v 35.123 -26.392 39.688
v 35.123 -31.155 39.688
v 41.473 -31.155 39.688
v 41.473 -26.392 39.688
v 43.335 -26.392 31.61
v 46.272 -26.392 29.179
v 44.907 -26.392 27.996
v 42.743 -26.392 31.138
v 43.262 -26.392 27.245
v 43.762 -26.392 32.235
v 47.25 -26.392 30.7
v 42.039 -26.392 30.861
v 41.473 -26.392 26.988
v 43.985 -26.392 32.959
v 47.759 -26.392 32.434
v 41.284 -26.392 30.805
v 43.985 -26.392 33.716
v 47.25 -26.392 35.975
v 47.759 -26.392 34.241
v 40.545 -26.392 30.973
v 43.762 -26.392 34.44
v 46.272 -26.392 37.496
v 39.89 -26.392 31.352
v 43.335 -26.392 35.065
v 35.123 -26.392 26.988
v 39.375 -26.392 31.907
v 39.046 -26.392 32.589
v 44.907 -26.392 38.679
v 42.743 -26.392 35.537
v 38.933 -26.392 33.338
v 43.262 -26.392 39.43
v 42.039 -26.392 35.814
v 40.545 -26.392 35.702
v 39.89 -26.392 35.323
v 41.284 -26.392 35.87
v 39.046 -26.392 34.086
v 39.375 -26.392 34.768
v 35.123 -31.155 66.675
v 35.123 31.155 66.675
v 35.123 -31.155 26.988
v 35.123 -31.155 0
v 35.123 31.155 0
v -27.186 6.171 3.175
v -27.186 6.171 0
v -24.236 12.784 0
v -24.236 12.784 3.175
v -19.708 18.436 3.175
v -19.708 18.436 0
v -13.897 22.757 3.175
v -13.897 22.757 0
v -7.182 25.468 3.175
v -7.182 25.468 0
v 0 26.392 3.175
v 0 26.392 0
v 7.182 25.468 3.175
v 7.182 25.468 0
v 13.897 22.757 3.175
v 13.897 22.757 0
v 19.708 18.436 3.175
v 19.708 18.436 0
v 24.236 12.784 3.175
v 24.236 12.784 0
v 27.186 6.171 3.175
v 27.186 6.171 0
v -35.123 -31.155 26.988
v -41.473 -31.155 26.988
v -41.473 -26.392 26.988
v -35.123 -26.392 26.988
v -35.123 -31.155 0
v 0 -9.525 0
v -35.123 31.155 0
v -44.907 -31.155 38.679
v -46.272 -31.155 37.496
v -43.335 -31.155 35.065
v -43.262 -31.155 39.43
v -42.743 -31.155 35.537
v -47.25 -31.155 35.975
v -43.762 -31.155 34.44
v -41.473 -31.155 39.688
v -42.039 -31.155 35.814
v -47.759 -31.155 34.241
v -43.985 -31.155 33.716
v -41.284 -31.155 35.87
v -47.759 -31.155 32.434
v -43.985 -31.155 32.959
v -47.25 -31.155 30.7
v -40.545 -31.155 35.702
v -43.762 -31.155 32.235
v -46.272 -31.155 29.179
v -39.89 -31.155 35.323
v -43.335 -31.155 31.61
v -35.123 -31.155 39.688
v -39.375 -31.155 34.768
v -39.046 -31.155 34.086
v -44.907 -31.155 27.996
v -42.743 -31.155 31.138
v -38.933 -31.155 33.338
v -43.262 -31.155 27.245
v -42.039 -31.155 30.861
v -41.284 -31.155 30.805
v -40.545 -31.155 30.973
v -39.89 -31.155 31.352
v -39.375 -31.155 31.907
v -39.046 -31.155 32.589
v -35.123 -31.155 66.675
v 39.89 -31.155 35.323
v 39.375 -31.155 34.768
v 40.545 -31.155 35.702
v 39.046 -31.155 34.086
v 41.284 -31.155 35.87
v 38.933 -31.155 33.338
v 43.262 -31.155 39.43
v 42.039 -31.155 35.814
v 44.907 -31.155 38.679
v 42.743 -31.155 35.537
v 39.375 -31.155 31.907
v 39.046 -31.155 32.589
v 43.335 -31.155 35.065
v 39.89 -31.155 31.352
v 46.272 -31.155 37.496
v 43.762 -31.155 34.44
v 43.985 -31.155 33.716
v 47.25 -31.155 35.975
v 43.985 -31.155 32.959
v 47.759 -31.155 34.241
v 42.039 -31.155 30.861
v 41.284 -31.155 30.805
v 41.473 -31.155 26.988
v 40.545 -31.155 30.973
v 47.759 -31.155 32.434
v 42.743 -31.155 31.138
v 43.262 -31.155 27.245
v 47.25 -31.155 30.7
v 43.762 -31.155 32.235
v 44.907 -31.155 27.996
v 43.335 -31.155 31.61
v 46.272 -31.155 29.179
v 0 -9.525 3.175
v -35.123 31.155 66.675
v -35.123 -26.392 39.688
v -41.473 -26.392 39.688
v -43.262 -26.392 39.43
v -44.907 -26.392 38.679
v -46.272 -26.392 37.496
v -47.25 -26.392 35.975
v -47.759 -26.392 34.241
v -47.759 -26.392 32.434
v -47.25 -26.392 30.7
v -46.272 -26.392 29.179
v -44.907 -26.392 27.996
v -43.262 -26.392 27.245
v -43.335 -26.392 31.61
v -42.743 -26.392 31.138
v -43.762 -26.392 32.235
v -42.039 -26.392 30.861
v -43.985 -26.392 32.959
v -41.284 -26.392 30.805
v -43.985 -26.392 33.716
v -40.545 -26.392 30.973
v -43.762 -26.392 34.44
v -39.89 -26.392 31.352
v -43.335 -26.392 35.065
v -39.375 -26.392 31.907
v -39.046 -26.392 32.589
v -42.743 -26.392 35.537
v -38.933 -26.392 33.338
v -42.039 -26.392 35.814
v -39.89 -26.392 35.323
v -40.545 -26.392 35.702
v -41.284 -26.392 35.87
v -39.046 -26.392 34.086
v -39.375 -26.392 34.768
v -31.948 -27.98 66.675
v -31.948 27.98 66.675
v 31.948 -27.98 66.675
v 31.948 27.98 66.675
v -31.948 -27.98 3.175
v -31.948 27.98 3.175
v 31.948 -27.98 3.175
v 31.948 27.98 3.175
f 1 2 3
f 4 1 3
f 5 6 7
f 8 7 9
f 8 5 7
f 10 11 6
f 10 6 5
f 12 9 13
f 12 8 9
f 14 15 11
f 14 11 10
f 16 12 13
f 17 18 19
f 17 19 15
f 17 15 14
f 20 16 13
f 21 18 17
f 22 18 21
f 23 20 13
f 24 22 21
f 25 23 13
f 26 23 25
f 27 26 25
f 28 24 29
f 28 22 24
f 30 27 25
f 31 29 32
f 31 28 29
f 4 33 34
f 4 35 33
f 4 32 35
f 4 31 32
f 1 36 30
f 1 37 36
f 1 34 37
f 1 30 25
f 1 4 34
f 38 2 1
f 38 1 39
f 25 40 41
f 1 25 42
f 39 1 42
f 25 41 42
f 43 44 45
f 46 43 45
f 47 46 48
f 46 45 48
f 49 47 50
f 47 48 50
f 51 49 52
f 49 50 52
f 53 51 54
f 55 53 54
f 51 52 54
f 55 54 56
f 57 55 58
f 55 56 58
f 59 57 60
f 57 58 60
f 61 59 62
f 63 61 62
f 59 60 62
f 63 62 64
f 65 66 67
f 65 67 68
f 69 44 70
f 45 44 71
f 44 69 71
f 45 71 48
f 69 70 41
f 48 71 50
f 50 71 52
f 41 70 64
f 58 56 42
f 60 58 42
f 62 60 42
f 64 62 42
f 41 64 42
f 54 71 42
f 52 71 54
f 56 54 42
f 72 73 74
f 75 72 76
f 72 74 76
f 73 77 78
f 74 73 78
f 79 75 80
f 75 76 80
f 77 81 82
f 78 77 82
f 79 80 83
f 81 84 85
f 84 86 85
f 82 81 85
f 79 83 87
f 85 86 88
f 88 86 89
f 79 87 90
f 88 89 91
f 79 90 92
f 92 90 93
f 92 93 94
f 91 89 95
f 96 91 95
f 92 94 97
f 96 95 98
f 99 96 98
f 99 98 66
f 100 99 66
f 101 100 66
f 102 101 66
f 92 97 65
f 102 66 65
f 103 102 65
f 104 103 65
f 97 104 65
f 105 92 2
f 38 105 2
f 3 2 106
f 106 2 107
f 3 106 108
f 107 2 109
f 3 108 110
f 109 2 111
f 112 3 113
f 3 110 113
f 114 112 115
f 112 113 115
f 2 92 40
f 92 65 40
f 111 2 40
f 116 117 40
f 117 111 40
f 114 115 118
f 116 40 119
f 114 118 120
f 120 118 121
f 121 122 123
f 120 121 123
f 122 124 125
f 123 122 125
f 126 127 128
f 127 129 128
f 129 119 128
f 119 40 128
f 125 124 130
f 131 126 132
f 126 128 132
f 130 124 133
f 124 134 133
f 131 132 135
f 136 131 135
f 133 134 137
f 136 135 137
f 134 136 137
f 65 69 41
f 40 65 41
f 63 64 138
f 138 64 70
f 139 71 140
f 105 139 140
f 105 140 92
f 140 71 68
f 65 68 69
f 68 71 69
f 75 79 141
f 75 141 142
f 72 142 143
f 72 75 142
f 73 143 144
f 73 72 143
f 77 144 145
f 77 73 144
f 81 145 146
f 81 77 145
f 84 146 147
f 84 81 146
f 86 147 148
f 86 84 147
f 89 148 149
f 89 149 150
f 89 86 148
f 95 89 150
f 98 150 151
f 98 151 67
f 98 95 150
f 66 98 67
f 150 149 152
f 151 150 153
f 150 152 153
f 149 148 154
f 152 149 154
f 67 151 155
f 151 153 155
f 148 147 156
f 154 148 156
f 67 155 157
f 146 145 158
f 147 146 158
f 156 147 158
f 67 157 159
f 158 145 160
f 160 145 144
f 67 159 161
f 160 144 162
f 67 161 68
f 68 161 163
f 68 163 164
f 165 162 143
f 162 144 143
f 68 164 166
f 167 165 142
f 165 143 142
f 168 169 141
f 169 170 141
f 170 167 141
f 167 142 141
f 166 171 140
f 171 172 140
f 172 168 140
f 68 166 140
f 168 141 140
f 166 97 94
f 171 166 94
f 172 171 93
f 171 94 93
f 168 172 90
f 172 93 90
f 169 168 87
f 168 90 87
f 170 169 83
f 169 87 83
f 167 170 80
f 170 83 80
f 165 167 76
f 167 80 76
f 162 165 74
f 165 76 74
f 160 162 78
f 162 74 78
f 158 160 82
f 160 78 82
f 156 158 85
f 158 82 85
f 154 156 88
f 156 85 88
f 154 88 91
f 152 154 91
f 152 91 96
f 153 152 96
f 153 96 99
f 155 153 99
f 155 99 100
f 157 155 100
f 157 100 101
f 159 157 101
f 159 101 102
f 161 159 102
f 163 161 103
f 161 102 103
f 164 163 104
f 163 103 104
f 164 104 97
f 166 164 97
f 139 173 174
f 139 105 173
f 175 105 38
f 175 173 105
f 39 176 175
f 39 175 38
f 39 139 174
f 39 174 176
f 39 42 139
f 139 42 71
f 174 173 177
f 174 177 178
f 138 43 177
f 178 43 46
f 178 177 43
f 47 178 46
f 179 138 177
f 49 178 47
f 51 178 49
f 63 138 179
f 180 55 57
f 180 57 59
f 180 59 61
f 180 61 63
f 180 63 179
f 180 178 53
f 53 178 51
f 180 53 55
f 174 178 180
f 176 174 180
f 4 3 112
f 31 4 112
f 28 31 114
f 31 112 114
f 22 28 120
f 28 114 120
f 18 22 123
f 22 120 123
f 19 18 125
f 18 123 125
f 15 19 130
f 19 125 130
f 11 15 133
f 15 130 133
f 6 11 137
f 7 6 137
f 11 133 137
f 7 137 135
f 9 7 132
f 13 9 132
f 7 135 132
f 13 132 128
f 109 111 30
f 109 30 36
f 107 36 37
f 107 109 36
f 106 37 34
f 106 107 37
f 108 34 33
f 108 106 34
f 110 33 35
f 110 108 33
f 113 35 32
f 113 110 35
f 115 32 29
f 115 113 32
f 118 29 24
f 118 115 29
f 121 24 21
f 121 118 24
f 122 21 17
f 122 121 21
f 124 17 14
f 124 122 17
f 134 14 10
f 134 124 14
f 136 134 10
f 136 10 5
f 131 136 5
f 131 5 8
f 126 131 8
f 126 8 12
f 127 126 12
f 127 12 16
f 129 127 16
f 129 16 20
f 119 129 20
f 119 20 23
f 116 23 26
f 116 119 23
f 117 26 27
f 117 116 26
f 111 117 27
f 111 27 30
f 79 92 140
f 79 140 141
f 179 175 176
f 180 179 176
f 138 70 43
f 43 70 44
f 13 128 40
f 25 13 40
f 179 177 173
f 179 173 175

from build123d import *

# Parameters (mm, degrees)
F0_W     = 63.896875
F0_H     = 55.959375
F1_DEPTH = 66.675
F2_W     = 63.896875
F2_H     = 55.959375
F3_DEPTH = 3.175
F4_R     = 2.54
F5_DEPTH = 4.7625


# Not quite as in the source:
# - a pattern or mirror of a feature is missing from the dataset's text; its kind, count and spacing are read off the source's solid


with BuildPart() as f1:
    # F0 (on Top) → F1 (new body)
    with BuildSketch(Plane.XY):
        Polygon((35.1234375, -31.1546875), (35.1234375, 31.1546875), (-35.1234375, 31.1546875), (-35.1234375, -31.1546875), align=None)
        Rectangle(F0_W, F0_H, mode=Mode.SUBTRACT)
    extrude(amount=F1_DEPTH)

    # F2 (on Top) → F3 (join)
    with BuildSketch(Plane.XY):
        Rectangle(F2_W, F2_H)
        with BuildLine():
            ThreePointArc((-27.1859375, 6.1708083338), (0, 26.3921875), (27.1859375, 6.1708083338))
            Line((27.1859375, 6.1708083338), (0, -9.525))
            Line((0, -9.525), (-27.1859375, 6.1708083338))
        make_face(mode=Mode.SUBTRACT)
    extrude(amount=F3_DEPTH)

    # F4 (on face) → F5 (join)
    with BuildSketch(Plane.XZ.offset(31.1546875)):
        with BuildLine():
            Line((-35.1234375, 26.9875), (-35.1234375, 39.6875))
            Line((-35.1234375, 39.6875), (-41.4734375, 39.6875))
            ThreePointArc((-41.4734375, 39.6875), (-47.8234375, 33.3375), (-41.4734375, 26.9875))
            Line((-41.4734375, 26.9875), (-35.1234375, 26.9875))
        make_face()
        with Locations((-41.4734375, 33.3375)):
            Circle(F4_R, mode=Mode.SUBTRACT)
    f5 = extrude(amount=-F5_DEPTH)

    # F5_copies: F5 across plane
    add(f5.mirror(Plane(origin=(0, 0, 0), x_dir=(0, 0, 1), z_dir=(1, 0, 0))))


solid = f1.part
